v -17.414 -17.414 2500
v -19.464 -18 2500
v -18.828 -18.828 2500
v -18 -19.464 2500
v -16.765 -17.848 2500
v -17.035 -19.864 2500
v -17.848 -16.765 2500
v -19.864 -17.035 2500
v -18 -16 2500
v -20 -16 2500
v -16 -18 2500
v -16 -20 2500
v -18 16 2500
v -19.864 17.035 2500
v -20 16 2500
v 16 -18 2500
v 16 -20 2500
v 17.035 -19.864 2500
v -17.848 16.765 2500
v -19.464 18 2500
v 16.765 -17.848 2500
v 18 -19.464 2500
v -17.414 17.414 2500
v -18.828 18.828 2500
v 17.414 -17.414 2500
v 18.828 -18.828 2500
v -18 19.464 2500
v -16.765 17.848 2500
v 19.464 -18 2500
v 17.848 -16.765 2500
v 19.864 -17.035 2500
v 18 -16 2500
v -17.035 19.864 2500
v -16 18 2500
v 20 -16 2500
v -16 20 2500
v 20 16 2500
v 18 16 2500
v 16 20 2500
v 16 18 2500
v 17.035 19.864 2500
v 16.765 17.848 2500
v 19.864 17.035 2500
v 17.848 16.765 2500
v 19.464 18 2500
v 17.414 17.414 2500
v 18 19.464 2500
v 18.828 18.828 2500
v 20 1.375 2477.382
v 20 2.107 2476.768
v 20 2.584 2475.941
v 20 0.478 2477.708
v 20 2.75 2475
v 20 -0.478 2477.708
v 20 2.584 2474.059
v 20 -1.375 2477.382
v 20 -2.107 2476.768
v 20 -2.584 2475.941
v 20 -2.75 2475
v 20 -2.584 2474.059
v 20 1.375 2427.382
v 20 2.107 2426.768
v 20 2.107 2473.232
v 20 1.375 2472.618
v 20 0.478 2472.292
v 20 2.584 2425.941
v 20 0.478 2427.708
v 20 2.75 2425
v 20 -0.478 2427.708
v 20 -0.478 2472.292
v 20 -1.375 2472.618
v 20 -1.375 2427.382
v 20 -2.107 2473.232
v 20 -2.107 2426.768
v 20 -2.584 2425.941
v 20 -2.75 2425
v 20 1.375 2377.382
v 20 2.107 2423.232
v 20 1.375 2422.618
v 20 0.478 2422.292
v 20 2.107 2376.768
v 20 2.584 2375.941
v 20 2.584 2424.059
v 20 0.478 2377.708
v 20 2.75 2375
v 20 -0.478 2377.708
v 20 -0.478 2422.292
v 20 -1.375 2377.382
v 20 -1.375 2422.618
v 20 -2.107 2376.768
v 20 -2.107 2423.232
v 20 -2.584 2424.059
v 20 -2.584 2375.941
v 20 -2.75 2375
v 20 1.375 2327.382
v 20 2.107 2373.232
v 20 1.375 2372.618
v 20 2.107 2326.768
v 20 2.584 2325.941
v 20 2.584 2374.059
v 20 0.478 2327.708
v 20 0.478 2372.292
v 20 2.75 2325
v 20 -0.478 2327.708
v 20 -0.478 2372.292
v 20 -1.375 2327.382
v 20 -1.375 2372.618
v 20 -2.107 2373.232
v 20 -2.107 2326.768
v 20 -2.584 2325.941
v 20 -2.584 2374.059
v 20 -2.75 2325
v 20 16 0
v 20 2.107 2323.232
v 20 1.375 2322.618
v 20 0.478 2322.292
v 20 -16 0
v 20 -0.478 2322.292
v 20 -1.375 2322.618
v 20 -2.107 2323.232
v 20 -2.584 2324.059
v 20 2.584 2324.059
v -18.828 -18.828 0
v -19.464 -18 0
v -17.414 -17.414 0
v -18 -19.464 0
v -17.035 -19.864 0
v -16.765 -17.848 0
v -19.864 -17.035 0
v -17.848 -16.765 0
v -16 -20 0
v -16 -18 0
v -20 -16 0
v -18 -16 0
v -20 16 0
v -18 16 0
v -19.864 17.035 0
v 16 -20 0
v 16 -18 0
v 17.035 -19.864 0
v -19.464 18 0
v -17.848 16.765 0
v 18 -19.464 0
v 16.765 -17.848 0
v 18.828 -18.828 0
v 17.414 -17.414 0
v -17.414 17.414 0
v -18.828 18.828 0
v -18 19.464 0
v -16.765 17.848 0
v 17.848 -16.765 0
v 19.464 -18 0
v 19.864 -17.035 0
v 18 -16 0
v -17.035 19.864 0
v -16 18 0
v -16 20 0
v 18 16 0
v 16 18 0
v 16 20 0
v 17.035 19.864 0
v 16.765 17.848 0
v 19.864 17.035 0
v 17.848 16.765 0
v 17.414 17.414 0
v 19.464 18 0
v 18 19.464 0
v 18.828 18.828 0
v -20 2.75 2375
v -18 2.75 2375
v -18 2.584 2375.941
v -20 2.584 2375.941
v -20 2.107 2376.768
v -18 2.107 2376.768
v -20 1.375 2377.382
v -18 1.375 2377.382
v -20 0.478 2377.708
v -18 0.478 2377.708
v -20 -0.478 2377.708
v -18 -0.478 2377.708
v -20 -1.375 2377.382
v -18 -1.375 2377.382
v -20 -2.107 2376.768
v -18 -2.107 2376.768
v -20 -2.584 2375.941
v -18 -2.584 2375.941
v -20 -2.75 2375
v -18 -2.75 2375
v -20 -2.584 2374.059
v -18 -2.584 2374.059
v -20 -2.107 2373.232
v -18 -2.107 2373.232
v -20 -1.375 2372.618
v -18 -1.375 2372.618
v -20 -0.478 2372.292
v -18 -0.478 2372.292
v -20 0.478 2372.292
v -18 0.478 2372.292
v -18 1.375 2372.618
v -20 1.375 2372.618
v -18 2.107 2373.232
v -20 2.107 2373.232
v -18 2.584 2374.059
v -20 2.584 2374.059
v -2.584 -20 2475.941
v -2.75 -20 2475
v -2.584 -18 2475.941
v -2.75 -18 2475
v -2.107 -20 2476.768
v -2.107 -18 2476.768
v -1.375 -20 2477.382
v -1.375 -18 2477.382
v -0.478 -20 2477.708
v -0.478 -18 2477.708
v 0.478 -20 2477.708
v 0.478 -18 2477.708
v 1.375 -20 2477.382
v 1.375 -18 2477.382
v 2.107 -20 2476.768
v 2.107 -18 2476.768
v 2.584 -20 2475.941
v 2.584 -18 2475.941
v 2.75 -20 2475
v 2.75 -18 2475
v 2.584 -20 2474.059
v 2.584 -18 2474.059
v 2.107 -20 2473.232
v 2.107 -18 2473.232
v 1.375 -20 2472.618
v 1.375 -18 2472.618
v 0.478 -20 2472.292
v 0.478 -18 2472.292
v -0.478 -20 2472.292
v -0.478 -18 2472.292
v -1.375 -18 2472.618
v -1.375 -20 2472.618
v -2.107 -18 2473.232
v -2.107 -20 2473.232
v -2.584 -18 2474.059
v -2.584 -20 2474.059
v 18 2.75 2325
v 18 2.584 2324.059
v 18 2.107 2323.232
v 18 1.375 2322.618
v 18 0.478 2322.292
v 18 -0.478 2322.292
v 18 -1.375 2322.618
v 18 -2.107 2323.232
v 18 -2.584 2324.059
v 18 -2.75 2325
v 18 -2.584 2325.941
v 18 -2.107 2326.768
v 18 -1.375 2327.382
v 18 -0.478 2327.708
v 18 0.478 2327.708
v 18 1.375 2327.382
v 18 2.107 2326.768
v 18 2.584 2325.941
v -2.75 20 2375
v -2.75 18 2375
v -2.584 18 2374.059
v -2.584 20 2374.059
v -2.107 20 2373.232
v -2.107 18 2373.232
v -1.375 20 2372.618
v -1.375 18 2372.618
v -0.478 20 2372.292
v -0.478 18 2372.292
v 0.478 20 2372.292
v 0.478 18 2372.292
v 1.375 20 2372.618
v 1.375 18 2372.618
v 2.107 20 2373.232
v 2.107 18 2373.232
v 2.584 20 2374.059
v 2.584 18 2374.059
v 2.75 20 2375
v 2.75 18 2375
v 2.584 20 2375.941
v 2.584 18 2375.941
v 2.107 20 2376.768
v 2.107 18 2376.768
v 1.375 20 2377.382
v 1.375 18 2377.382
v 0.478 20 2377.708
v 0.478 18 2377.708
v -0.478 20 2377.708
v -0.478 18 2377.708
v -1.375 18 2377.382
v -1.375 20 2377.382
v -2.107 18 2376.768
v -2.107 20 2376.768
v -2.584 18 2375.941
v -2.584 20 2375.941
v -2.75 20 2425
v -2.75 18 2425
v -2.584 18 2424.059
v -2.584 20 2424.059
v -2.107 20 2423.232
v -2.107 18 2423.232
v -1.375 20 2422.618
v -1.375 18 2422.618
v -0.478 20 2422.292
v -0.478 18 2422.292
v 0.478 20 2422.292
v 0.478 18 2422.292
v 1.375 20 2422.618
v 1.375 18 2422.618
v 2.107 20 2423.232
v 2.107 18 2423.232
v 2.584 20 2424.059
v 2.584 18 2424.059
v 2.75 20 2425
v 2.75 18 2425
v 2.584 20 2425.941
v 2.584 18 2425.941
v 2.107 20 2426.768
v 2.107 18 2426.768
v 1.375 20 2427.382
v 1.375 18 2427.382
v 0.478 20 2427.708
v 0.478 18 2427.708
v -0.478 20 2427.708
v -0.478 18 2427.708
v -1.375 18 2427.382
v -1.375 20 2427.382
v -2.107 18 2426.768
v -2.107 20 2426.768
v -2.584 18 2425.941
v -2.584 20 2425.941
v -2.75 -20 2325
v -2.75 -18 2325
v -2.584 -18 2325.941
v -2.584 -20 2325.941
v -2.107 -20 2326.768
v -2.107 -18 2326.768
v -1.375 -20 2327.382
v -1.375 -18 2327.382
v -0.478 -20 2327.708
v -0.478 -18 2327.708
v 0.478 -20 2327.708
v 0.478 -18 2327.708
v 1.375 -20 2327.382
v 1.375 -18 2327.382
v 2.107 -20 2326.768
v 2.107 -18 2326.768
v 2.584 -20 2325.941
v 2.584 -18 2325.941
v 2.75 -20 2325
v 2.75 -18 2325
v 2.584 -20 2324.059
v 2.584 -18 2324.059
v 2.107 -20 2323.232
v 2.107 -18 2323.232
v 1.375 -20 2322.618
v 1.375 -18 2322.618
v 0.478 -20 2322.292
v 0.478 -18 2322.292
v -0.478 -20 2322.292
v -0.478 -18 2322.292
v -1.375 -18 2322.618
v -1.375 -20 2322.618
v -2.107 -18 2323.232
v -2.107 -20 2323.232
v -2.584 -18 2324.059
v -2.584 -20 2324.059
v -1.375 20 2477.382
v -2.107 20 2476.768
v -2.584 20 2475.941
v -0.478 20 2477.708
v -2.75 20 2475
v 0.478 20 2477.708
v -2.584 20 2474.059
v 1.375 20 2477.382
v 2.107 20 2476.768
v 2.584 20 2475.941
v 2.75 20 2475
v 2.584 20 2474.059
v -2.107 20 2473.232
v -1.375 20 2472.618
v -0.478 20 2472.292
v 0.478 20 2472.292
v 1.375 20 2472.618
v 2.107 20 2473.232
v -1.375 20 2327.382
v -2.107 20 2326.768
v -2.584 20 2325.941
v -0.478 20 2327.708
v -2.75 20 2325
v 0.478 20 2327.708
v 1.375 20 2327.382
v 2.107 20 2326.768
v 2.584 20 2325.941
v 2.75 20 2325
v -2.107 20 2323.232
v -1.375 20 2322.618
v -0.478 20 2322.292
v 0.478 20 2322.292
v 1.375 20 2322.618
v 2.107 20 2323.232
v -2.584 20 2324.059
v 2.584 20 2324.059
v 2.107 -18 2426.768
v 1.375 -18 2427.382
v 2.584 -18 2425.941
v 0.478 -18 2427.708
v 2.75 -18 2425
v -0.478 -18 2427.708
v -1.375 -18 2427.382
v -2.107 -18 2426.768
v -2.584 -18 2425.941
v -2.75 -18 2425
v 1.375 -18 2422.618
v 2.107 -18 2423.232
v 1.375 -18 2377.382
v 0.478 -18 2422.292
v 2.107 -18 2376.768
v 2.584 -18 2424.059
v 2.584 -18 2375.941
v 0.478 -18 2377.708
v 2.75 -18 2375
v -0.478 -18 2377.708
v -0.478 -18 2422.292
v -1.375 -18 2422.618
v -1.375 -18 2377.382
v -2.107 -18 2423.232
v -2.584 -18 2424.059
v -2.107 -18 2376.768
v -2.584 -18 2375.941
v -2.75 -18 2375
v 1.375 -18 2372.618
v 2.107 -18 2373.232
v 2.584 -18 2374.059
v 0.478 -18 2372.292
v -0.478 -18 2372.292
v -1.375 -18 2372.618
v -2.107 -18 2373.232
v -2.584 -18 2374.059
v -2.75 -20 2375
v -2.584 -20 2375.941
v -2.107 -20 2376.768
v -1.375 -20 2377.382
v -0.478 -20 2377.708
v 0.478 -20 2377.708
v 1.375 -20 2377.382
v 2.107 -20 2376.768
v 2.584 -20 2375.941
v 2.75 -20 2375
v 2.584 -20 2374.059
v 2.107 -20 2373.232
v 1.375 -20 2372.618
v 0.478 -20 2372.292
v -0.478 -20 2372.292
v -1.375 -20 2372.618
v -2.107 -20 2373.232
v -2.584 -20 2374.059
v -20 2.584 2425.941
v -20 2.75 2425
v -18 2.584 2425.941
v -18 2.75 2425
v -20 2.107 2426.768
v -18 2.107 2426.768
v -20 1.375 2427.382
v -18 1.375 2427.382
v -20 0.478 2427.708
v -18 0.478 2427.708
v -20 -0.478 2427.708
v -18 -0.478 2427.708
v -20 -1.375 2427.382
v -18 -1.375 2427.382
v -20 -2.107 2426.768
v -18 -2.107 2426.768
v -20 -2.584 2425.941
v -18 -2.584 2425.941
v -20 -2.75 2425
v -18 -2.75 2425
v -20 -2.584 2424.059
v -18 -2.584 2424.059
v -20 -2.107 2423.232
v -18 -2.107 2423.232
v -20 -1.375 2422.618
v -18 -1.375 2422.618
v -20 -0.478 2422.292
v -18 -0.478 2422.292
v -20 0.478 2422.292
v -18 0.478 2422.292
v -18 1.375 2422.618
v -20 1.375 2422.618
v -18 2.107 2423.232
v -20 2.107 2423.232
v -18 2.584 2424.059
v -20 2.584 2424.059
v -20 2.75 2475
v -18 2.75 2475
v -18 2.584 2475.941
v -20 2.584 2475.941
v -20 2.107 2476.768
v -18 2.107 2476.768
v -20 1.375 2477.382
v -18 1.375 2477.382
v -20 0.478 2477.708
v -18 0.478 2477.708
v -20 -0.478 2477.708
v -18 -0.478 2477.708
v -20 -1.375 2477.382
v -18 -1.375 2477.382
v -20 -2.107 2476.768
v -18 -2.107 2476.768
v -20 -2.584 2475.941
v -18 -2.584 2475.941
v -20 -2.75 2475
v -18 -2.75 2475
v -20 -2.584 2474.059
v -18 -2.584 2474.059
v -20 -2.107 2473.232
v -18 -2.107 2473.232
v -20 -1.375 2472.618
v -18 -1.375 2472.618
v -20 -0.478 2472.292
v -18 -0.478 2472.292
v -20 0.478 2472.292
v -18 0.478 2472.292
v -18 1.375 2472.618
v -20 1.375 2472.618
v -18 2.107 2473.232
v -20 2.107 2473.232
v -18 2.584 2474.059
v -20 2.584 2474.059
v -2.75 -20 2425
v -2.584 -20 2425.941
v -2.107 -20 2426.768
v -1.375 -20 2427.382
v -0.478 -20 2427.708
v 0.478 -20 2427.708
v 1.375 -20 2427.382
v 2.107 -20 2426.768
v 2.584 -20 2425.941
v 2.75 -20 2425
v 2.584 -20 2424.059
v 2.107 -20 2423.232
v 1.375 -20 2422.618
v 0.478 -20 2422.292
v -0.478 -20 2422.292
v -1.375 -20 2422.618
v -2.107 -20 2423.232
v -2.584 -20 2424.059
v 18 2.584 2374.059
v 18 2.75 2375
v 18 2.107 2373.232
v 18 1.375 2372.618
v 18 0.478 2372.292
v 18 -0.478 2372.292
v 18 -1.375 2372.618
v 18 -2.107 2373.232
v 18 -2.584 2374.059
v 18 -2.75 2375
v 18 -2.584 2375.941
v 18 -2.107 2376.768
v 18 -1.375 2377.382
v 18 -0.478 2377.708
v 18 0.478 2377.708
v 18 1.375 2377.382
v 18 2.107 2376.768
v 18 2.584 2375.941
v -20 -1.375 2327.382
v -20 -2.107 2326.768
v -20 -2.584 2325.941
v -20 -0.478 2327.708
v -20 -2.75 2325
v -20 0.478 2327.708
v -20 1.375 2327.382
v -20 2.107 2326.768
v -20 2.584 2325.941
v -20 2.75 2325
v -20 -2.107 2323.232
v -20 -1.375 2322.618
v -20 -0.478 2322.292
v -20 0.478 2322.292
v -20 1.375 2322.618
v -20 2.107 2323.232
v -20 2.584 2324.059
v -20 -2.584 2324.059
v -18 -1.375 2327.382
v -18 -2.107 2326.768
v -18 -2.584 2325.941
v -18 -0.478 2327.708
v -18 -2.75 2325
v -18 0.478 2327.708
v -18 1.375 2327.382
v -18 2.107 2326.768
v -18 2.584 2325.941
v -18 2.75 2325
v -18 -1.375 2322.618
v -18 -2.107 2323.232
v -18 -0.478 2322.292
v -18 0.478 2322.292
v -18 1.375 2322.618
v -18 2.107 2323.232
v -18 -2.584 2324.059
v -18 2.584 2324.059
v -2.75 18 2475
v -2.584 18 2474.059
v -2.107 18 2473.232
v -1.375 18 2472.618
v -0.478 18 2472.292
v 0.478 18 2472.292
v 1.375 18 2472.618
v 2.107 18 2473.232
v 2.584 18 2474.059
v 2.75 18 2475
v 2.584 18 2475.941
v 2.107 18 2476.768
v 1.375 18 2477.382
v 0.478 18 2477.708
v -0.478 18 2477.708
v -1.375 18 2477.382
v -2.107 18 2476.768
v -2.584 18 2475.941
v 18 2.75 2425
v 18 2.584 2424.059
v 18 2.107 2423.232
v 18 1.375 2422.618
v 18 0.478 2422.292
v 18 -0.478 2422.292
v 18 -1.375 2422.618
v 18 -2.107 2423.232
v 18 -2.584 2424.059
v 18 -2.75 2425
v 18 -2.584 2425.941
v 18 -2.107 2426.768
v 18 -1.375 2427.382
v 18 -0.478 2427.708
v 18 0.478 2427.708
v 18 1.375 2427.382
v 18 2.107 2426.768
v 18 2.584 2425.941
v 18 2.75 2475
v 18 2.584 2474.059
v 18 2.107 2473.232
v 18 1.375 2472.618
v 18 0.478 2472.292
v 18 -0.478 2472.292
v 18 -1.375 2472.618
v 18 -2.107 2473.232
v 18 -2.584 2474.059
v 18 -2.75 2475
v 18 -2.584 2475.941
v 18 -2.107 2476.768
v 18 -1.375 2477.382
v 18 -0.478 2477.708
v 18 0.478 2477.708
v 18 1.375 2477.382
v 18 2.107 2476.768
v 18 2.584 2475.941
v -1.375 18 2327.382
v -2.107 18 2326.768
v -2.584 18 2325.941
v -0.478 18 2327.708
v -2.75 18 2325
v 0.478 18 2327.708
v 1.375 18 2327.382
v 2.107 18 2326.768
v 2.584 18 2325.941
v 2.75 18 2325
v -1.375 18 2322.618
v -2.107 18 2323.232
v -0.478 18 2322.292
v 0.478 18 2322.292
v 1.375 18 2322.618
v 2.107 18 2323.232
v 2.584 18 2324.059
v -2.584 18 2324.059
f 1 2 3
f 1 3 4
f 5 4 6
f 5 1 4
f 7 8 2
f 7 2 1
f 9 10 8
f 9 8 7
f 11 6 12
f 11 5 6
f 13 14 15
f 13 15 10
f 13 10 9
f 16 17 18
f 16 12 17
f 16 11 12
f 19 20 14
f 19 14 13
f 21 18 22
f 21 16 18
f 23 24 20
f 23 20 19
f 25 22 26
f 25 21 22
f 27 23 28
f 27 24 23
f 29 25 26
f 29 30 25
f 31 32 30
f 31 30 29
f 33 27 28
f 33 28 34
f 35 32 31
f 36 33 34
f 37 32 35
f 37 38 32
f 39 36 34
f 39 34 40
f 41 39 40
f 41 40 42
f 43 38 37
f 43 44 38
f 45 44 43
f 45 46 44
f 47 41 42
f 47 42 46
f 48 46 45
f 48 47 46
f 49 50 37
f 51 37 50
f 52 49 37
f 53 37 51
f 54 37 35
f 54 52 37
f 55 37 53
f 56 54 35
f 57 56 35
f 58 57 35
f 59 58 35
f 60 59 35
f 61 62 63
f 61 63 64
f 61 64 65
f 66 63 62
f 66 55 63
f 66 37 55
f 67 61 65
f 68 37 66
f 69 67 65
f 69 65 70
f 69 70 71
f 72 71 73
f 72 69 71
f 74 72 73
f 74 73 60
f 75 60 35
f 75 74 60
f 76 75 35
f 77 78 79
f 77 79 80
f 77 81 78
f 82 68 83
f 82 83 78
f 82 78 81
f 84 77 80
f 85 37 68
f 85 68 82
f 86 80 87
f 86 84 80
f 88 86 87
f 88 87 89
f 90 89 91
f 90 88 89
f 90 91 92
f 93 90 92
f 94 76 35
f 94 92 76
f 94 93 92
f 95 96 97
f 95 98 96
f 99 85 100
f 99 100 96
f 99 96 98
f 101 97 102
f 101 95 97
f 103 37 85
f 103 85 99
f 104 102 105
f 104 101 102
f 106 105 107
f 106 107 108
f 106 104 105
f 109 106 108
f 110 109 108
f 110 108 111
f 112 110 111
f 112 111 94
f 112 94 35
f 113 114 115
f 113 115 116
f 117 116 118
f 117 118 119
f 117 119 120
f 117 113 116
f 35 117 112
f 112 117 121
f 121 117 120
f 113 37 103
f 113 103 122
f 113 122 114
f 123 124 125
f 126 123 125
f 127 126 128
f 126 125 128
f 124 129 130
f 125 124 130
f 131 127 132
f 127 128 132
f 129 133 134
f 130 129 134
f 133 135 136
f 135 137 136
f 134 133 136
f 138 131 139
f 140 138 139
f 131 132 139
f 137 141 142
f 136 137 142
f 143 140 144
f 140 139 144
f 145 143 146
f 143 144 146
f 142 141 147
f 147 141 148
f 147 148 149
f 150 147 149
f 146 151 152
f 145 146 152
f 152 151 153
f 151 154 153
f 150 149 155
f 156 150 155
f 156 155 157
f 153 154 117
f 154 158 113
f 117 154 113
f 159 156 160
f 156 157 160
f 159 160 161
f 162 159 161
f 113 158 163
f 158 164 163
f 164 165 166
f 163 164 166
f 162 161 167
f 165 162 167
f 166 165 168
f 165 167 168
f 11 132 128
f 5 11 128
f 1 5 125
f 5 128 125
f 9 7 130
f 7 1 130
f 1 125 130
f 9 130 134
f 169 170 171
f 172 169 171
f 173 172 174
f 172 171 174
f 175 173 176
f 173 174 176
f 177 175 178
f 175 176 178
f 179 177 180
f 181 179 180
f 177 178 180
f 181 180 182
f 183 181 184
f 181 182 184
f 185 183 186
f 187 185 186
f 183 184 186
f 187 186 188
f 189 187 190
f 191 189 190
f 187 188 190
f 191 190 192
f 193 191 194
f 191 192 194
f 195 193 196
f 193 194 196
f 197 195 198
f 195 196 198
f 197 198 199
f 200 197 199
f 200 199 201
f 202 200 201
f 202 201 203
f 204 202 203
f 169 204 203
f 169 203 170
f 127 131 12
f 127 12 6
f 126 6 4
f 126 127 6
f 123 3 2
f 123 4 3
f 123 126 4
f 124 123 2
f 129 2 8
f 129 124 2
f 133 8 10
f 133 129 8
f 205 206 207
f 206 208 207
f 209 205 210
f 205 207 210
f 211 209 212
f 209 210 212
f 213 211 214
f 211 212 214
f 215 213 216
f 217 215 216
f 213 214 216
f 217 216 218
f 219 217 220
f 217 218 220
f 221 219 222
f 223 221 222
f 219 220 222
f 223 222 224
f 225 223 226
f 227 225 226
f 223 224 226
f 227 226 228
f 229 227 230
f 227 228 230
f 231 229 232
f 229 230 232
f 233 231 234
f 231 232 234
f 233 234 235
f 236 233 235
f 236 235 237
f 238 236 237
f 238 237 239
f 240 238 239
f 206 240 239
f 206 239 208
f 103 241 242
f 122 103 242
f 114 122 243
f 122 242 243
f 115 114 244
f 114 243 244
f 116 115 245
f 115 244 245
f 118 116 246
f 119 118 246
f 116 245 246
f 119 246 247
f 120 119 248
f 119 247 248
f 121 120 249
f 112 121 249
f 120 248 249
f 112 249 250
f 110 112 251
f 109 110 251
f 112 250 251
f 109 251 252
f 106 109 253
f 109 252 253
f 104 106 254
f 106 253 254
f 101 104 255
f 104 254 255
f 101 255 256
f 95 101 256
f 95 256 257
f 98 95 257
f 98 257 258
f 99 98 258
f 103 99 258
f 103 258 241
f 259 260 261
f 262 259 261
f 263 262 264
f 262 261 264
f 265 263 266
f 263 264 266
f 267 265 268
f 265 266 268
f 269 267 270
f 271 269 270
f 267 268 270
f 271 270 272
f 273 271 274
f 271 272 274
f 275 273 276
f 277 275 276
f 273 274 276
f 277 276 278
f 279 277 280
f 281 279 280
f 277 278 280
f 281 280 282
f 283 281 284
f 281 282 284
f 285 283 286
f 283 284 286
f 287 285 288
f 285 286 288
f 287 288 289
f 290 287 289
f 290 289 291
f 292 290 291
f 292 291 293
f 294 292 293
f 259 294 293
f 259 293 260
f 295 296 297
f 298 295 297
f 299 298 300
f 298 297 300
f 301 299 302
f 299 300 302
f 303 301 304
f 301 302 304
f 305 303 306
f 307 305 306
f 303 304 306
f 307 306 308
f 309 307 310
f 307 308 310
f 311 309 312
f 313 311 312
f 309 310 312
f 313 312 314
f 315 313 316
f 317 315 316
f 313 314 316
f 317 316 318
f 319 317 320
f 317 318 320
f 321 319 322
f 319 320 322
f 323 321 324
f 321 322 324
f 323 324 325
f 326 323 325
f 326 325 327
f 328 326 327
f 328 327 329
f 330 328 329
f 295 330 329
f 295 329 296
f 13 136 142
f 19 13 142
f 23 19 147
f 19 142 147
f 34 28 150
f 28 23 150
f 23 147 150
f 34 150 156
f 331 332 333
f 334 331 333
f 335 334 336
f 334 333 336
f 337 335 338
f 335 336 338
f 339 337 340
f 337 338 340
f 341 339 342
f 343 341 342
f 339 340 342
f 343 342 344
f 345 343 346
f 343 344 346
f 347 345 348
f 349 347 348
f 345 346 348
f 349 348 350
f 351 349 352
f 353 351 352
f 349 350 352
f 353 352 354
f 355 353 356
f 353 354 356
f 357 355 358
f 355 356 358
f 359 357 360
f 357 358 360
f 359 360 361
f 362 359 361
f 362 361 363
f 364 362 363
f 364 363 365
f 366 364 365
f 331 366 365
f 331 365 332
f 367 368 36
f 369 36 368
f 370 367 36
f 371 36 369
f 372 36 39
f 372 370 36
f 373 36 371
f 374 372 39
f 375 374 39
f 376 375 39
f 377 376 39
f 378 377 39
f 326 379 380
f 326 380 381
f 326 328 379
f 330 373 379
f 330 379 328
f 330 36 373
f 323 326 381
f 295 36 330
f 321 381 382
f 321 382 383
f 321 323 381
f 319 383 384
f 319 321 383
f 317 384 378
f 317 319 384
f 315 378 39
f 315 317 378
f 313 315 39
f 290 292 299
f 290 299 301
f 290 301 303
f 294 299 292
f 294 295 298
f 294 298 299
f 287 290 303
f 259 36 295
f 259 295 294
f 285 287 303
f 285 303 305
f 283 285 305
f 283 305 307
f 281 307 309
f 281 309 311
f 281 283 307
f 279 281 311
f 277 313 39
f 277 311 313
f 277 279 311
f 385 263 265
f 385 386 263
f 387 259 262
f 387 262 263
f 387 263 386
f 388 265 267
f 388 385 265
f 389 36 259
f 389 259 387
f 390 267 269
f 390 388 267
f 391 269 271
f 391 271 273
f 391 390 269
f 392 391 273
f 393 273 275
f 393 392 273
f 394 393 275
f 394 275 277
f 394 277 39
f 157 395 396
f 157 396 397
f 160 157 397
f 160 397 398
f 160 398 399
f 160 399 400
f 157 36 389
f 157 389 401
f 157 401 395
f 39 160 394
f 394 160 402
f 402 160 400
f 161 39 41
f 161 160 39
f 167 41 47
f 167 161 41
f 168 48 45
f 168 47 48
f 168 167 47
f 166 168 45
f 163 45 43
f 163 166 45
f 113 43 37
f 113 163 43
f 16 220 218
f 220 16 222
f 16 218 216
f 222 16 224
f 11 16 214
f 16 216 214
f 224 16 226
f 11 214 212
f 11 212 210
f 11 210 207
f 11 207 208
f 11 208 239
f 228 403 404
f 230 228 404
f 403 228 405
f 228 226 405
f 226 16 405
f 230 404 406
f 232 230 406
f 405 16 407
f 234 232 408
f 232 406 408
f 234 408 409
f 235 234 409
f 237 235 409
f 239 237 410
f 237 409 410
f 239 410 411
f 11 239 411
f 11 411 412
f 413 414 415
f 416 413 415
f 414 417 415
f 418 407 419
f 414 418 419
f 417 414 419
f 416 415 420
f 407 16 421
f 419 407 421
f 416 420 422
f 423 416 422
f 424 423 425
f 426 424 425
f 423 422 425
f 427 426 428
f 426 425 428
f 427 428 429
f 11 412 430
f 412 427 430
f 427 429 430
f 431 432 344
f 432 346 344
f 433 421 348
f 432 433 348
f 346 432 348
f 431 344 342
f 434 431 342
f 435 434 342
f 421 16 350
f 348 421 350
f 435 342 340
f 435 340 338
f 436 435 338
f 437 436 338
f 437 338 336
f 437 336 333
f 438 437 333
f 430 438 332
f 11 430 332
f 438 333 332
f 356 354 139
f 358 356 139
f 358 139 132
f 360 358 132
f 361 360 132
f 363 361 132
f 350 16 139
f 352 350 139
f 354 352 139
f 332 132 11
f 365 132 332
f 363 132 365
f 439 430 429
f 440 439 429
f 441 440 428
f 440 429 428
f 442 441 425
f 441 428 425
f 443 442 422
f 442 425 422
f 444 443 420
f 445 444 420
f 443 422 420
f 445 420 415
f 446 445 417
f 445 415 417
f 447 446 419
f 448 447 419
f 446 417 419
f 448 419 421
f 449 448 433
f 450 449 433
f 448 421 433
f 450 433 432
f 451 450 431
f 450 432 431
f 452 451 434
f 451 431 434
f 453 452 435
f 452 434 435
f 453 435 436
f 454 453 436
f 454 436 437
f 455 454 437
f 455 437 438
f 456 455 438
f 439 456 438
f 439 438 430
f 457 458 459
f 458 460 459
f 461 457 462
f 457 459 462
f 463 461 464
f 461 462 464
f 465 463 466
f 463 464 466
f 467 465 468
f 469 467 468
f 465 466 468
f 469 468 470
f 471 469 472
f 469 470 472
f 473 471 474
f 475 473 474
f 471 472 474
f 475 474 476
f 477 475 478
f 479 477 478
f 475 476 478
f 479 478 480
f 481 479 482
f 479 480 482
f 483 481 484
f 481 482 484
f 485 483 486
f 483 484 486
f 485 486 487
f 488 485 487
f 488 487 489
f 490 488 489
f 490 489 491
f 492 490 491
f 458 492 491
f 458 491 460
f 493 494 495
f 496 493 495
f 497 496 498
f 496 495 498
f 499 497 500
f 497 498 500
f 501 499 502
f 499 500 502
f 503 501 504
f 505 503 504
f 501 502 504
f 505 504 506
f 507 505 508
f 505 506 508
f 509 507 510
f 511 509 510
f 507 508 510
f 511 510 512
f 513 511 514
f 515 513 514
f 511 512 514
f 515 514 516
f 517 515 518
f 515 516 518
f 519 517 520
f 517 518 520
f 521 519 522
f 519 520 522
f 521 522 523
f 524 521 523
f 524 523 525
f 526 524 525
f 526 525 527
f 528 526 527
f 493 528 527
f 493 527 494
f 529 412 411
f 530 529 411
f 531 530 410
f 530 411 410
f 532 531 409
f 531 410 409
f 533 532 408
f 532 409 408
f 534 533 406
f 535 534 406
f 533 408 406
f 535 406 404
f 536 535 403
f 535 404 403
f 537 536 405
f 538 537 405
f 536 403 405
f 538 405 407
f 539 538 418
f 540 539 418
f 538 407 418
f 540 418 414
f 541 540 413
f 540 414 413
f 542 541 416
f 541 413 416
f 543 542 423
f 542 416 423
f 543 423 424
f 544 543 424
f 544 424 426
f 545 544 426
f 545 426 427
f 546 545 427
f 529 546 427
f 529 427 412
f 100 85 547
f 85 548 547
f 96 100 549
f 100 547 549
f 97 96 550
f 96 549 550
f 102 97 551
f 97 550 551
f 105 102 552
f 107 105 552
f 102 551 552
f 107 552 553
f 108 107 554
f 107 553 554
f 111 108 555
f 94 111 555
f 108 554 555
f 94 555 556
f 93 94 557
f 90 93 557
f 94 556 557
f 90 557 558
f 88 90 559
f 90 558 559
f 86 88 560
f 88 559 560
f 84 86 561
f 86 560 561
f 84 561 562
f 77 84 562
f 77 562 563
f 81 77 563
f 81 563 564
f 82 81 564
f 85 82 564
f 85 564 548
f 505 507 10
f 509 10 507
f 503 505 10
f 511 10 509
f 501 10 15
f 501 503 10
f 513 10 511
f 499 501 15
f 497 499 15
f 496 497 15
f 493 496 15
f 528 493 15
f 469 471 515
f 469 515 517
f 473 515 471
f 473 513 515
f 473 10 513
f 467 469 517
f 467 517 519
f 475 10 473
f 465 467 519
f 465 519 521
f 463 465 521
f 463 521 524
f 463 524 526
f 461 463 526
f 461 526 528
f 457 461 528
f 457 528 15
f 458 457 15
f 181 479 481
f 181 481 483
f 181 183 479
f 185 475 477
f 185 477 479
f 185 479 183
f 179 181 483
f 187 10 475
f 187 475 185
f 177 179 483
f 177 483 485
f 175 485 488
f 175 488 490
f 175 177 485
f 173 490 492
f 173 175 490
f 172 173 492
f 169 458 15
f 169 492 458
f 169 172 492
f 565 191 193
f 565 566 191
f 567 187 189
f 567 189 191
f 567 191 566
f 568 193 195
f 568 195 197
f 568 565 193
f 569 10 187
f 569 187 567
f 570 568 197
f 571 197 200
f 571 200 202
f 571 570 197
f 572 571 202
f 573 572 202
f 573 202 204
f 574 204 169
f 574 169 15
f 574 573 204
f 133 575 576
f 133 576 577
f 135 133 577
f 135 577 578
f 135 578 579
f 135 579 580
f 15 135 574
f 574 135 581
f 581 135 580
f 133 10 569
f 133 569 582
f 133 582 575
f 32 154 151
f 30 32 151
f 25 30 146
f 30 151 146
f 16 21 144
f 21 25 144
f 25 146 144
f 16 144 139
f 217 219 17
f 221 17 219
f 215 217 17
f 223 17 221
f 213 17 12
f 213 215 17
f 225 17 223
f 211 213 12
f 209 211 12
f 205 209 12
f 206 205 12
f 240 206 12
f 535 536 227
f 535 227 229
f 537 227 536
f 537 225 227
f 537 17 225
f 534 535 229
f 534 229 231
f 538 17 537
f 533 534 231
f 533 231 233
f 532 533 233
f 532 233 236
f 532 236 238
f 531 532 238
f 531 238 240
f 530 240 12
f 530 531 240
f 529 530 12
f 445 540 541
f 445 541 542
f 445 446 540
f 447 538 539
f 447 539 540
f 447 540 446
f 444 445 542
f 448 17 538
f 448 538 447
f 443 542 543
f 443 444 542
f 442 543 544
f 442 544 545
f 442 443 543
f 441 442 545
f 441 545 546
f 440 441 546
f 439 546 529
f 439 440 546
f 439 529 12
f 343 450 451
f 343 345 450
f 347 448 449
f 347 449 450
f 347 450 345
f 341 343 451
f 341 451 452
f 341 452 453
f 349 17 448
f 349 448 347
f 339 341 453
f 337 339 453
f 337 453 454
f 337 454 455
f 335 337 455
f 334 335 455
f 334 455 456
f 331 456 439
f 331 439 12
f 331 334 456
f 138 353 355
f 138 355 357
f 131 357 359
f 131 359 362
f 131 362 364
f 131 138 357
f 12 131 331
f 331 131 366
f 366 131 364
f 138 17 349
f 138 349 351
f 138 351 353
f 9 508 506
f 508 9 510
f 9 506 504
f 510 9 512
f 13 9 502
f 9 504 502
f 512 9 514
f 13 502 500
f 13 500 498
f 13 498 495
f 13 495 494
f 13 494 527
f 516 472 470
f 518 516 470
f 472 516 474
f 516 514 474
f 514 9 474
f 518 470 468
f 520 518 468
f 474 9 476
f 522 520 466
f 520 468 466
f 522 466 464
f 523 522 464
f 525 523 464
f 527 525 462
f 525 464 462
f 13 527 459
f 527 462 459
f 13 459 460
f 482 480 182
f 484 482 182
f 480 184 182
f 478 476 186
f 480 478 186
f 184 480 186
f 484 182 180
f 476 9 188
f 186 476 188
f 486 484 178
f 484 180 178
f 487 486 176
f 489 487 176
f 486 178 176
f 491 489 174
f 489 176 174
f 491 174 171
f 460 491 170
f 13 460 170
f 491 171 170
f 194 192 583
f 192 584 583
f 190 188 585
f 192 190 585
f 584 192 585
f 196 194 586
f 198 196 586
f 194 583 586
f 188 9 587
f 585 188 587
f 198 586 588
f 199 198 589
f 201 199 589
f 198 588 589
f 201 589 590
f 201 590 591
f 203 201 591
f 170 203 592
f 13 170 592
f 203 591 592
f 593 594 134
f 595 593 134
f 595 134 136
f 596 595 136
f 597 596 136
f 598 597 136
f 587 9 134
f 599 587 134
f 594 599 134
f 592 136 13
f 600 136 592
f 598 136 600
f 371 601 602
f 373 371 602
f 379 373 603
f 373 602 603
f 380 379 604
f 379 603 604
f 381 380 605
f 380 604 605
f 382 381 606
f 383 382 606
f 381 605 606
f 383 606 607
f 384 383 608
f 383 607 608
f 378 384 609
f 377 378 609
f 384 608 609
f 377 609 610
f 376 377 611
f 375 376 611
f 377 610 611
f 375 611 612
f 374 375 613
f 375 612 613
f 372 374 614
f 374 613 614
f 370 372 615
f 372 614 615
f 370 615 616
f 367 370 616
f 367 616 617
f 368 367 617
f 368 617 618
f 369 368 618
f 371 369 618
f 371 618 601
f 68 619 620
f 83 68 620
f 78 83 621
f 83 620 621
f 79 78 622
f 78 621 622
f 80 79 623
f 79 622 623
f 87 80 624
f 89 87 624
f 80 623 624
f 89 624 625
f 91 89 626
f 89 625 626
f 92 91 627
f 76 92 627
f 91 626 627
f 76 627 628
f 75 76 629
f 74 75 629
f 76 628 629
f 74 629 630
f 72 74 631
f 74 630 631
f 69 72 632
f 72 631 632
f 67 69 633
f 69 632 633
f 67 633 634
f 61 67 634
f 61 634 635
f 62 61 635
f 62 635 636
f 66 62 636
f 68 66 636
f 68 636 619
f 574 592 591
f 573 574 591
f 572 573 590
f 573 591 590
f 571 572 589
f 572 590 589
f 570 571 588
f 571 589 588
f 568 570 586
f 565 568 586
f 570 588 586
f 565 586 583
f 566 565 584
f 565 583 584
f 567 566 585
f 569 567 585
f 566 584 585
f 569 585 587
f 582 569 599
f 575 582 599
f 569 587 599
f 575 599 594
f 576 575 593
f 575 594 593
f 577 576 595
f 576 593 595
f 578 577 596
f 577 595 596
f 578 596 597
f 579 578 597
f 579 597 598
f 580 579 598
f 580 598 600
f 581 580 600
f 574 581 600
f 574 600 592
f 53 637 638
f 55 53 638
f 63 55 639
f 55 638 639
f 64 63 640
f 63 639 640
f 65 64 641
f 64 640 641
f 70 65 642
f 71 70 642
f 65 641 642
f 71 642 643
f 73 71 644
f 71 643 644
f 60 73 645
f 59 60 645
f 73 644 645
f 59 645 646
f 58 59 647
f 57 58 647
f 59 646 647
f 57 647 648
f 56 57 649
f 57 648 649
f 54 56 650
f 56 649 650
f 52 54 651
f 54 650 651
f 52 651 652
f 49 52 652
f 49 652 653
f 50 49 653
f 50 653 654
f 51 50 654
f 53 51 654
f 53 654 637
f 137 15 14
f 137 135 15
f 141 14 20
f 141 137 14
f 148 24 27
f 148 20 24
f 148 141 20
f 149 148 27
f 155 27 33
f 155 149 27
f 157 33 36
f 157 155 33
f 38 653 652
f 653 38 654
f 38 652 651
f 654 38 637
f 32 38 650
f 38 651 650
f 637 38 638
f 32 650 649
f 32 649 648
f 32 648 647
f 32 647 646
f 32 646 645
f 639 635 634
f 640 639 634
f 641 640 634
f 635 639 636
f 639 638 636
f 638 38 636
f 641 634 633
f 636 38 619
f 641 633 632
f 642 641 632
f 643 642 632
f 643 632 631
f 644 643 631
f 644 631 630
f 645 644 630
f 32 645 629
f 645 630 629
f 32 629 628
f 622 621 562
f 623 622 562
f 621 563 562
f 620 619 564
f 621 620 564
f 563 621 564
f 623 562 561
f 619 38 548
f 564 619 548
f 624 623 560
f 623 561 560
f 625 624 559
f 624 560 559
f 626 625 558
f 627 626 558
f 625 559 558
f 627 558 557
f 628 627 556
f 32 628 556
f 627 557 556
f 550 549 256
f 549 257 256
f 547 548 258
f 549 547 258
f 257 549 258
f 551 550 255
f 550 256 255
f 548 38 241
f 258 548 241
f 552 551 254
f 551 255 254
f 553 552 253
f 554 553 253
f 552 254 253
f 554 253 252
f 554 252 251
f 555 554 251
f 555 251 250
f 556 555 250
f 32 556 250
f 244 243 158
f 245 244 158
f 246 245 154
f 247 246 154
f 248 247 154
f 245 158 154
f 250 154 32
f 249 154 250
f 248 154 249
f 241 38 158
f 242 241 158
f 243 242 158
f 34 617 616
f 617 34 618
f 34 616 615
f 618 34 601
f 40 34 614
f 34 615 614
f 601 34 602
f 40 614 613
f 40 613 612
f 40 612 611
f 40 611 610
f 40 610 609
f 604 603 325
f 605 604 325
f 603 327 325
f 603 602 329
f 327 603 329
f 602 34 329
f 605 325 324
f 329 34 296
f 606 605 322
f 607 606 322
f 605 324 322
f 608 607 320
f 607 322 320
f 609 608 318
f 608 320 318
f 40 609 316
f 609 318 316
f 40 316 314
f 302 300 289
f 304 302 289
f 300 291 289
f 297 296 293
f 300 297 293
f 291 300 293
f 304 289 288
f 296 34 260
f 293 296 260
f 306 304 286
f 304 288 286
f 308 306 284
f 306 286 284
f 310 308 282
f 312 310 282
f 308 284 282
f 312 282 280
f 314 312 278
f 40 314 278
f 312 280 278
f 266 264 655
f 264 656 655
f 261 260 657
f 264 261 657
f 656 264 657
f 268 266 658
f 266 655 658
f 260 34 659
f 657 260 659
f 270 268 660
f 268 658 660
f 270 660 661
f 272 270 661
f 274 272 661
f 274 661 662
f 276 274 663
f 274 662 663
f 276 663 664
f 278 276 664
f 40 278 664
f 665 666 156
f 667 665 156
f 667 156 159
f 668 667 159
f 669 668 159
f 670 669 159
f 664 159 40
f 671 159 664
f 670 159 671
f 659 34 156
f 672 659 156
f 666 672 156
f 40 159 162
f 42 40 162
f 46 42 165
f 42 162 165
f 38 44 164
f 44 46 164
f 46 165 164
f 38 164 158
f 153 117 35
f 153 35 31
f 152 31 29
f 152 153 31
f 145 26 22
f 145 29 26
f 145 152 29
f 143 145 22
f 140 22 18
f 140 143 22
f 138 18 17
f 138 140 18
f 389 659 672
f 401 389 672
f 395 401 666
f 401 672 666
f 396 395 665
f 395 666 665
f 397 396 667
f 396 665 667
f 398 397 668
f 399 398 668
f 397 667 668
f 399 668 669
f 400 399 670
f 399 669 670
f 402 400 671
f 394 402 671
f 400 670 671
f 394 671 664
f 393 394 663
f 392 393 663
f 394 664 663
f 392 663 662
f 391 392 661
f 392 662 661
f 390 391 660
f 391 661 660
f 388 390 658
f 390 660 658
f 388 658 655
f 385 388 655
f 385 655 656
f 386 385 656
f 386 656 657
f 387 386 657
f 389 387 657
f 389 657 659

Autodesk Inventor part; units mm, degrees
ref_plane "YZ Plane" through (0, 0, 0) normal (1, 0, 0) x (0, 1, 0)
ref_plane "Start Plane" through (0, 0, 0) normal (0, 0, 1) x (1, 0, 0)
ref_plane "End Plane" through (0, 0, 2500) normal (0, 0, 1) x (1, 0, 0)
sketch "Sketch" plane through (0, 0, 0) normal (0, 0, 1) x (1, 0, 0)
  line L0 (-20, -16) -> (-20, 16)
  line L1 (-16, 20) -> (16, 20)
  line L2 (20, 16) -> (20, -16)
  line L3 (16, -20) -> (-16, -20)
  arc A0 (-20, -16) -> (-16, -20) centre (-16, -16) ccw
  arc A1 (20, 16) -> (16, 20) centre (16, 16) ccw
  arc A2 (-16, 20) -> (-20, 16) centre (-16, 16) ccw
  arc A3 (16, -20) -> (20, -16) centre (16, -16) ccw
  arc A4 (-16, 18) -> (-18, 16) centre (-16, 16) ccw
  line L4 (-16, 18) -> (16, 18)
  arc A5 (18, 16) -> (16, 18) centre (16, 16) ccw
  line L5 (18, 16) -> (18, -16)
  arc A6 (16, -18) -> (18, -16) centre (16, -16) ccw
  line L6 (16, -18) -> (-16, -18)
  arc A7 (-18, -16) -> (-16, -18) centre (-16, -16) ccw
  line L7 (-18, -16) -> (-18, 16)
  line L8 (0, 29.1598) -> (0, -29.1598) construction
  line L9 (-29.1598, 0) -> (29.1598, 0) construction
  dimension "d7" = 4
  dimension "d9" = 40
  dimension "d11" = 40
  dimension "d12" = 2
  dimension "d15" = 20
  dimension "d16" = 20
extrude "Body" add sketch "Sketch" along normal up to surface (2500 mm away) from surface at 0
sketch "Sketch3" plane through (0, 0, 0) normal (0, 0, 1) x (1, 0, 0)
  line L0 (0, 0) -> (10, 0)
ref_plane "Work Plane3" through (0, 0, 0) normal (0, -1, 0) x (1, 0, 0)
sketch "Sketch5" plane through (0, 0, 0) normal (1, 0, 0) x (0, 1, 0)
  circle A0 centre (0, 2325) radius 2.75
  circle A1 centre (0, 2375) radius 2.75
  circle A2 centre (0, 2475) radius 2.75
  circle A3 centre (0, 2425) radius 2.75
  line L0 (16, 2500) -> (-16, 2500) projected
  point P0 (0, 0)
  point P1 (0, 2500)
  dimension "d19" = 5.5
  dimension "d21" = 50
  dimension "d22" = 50
  dimension "d23" = 50
  dimension "d25" = 25
extrude "Extrusion2" cut sketch "Sketch5" along normal through all both and the other way through all
pattern_circular "Circular Pattern1" count 2 over 90 about axis through (0, 0, -10) along (0, 0, 1) of "Extrusion2"
sketch "Sketch4" plane through (0, 0, 0) normal (0, -1, 0) x (1, 0, 0)
  line L0 (-2, 0) -> (12, 0) projected
  line L1 (-2, 2500) -> (12, 2500) projected
  dimension "d18" = 2500
equation "\"d7\" = G_IR"
equation "\"d9\" = G_W"
equation "\"d11\" = G_H"
equation "\"d12\" = G_T"
equation "\"d15\" = 0.5 * d9"
equation "\"d16\" = 0.5 * d11"
equation "\"d3\" = G_L"
equation "\"d22\" = d21"
equation "\"d23\" = d21"
equation "\"d25\" = 0.5 * d21"
equation "\"G_W\" = 40"
equation "\"G_H\" = 40"
equation "\"G_T\" = 2"
equation "\"G_IR\" = 4"
equation "\"G_L\" = d18"
equation "\"G_OFFSET_START\" = 0"
equation "\"G_OFFSET_END\" = 0"
properties part number "ISO 10799-2 - 40x40x2 - 2500" material "Stainless Steel"
